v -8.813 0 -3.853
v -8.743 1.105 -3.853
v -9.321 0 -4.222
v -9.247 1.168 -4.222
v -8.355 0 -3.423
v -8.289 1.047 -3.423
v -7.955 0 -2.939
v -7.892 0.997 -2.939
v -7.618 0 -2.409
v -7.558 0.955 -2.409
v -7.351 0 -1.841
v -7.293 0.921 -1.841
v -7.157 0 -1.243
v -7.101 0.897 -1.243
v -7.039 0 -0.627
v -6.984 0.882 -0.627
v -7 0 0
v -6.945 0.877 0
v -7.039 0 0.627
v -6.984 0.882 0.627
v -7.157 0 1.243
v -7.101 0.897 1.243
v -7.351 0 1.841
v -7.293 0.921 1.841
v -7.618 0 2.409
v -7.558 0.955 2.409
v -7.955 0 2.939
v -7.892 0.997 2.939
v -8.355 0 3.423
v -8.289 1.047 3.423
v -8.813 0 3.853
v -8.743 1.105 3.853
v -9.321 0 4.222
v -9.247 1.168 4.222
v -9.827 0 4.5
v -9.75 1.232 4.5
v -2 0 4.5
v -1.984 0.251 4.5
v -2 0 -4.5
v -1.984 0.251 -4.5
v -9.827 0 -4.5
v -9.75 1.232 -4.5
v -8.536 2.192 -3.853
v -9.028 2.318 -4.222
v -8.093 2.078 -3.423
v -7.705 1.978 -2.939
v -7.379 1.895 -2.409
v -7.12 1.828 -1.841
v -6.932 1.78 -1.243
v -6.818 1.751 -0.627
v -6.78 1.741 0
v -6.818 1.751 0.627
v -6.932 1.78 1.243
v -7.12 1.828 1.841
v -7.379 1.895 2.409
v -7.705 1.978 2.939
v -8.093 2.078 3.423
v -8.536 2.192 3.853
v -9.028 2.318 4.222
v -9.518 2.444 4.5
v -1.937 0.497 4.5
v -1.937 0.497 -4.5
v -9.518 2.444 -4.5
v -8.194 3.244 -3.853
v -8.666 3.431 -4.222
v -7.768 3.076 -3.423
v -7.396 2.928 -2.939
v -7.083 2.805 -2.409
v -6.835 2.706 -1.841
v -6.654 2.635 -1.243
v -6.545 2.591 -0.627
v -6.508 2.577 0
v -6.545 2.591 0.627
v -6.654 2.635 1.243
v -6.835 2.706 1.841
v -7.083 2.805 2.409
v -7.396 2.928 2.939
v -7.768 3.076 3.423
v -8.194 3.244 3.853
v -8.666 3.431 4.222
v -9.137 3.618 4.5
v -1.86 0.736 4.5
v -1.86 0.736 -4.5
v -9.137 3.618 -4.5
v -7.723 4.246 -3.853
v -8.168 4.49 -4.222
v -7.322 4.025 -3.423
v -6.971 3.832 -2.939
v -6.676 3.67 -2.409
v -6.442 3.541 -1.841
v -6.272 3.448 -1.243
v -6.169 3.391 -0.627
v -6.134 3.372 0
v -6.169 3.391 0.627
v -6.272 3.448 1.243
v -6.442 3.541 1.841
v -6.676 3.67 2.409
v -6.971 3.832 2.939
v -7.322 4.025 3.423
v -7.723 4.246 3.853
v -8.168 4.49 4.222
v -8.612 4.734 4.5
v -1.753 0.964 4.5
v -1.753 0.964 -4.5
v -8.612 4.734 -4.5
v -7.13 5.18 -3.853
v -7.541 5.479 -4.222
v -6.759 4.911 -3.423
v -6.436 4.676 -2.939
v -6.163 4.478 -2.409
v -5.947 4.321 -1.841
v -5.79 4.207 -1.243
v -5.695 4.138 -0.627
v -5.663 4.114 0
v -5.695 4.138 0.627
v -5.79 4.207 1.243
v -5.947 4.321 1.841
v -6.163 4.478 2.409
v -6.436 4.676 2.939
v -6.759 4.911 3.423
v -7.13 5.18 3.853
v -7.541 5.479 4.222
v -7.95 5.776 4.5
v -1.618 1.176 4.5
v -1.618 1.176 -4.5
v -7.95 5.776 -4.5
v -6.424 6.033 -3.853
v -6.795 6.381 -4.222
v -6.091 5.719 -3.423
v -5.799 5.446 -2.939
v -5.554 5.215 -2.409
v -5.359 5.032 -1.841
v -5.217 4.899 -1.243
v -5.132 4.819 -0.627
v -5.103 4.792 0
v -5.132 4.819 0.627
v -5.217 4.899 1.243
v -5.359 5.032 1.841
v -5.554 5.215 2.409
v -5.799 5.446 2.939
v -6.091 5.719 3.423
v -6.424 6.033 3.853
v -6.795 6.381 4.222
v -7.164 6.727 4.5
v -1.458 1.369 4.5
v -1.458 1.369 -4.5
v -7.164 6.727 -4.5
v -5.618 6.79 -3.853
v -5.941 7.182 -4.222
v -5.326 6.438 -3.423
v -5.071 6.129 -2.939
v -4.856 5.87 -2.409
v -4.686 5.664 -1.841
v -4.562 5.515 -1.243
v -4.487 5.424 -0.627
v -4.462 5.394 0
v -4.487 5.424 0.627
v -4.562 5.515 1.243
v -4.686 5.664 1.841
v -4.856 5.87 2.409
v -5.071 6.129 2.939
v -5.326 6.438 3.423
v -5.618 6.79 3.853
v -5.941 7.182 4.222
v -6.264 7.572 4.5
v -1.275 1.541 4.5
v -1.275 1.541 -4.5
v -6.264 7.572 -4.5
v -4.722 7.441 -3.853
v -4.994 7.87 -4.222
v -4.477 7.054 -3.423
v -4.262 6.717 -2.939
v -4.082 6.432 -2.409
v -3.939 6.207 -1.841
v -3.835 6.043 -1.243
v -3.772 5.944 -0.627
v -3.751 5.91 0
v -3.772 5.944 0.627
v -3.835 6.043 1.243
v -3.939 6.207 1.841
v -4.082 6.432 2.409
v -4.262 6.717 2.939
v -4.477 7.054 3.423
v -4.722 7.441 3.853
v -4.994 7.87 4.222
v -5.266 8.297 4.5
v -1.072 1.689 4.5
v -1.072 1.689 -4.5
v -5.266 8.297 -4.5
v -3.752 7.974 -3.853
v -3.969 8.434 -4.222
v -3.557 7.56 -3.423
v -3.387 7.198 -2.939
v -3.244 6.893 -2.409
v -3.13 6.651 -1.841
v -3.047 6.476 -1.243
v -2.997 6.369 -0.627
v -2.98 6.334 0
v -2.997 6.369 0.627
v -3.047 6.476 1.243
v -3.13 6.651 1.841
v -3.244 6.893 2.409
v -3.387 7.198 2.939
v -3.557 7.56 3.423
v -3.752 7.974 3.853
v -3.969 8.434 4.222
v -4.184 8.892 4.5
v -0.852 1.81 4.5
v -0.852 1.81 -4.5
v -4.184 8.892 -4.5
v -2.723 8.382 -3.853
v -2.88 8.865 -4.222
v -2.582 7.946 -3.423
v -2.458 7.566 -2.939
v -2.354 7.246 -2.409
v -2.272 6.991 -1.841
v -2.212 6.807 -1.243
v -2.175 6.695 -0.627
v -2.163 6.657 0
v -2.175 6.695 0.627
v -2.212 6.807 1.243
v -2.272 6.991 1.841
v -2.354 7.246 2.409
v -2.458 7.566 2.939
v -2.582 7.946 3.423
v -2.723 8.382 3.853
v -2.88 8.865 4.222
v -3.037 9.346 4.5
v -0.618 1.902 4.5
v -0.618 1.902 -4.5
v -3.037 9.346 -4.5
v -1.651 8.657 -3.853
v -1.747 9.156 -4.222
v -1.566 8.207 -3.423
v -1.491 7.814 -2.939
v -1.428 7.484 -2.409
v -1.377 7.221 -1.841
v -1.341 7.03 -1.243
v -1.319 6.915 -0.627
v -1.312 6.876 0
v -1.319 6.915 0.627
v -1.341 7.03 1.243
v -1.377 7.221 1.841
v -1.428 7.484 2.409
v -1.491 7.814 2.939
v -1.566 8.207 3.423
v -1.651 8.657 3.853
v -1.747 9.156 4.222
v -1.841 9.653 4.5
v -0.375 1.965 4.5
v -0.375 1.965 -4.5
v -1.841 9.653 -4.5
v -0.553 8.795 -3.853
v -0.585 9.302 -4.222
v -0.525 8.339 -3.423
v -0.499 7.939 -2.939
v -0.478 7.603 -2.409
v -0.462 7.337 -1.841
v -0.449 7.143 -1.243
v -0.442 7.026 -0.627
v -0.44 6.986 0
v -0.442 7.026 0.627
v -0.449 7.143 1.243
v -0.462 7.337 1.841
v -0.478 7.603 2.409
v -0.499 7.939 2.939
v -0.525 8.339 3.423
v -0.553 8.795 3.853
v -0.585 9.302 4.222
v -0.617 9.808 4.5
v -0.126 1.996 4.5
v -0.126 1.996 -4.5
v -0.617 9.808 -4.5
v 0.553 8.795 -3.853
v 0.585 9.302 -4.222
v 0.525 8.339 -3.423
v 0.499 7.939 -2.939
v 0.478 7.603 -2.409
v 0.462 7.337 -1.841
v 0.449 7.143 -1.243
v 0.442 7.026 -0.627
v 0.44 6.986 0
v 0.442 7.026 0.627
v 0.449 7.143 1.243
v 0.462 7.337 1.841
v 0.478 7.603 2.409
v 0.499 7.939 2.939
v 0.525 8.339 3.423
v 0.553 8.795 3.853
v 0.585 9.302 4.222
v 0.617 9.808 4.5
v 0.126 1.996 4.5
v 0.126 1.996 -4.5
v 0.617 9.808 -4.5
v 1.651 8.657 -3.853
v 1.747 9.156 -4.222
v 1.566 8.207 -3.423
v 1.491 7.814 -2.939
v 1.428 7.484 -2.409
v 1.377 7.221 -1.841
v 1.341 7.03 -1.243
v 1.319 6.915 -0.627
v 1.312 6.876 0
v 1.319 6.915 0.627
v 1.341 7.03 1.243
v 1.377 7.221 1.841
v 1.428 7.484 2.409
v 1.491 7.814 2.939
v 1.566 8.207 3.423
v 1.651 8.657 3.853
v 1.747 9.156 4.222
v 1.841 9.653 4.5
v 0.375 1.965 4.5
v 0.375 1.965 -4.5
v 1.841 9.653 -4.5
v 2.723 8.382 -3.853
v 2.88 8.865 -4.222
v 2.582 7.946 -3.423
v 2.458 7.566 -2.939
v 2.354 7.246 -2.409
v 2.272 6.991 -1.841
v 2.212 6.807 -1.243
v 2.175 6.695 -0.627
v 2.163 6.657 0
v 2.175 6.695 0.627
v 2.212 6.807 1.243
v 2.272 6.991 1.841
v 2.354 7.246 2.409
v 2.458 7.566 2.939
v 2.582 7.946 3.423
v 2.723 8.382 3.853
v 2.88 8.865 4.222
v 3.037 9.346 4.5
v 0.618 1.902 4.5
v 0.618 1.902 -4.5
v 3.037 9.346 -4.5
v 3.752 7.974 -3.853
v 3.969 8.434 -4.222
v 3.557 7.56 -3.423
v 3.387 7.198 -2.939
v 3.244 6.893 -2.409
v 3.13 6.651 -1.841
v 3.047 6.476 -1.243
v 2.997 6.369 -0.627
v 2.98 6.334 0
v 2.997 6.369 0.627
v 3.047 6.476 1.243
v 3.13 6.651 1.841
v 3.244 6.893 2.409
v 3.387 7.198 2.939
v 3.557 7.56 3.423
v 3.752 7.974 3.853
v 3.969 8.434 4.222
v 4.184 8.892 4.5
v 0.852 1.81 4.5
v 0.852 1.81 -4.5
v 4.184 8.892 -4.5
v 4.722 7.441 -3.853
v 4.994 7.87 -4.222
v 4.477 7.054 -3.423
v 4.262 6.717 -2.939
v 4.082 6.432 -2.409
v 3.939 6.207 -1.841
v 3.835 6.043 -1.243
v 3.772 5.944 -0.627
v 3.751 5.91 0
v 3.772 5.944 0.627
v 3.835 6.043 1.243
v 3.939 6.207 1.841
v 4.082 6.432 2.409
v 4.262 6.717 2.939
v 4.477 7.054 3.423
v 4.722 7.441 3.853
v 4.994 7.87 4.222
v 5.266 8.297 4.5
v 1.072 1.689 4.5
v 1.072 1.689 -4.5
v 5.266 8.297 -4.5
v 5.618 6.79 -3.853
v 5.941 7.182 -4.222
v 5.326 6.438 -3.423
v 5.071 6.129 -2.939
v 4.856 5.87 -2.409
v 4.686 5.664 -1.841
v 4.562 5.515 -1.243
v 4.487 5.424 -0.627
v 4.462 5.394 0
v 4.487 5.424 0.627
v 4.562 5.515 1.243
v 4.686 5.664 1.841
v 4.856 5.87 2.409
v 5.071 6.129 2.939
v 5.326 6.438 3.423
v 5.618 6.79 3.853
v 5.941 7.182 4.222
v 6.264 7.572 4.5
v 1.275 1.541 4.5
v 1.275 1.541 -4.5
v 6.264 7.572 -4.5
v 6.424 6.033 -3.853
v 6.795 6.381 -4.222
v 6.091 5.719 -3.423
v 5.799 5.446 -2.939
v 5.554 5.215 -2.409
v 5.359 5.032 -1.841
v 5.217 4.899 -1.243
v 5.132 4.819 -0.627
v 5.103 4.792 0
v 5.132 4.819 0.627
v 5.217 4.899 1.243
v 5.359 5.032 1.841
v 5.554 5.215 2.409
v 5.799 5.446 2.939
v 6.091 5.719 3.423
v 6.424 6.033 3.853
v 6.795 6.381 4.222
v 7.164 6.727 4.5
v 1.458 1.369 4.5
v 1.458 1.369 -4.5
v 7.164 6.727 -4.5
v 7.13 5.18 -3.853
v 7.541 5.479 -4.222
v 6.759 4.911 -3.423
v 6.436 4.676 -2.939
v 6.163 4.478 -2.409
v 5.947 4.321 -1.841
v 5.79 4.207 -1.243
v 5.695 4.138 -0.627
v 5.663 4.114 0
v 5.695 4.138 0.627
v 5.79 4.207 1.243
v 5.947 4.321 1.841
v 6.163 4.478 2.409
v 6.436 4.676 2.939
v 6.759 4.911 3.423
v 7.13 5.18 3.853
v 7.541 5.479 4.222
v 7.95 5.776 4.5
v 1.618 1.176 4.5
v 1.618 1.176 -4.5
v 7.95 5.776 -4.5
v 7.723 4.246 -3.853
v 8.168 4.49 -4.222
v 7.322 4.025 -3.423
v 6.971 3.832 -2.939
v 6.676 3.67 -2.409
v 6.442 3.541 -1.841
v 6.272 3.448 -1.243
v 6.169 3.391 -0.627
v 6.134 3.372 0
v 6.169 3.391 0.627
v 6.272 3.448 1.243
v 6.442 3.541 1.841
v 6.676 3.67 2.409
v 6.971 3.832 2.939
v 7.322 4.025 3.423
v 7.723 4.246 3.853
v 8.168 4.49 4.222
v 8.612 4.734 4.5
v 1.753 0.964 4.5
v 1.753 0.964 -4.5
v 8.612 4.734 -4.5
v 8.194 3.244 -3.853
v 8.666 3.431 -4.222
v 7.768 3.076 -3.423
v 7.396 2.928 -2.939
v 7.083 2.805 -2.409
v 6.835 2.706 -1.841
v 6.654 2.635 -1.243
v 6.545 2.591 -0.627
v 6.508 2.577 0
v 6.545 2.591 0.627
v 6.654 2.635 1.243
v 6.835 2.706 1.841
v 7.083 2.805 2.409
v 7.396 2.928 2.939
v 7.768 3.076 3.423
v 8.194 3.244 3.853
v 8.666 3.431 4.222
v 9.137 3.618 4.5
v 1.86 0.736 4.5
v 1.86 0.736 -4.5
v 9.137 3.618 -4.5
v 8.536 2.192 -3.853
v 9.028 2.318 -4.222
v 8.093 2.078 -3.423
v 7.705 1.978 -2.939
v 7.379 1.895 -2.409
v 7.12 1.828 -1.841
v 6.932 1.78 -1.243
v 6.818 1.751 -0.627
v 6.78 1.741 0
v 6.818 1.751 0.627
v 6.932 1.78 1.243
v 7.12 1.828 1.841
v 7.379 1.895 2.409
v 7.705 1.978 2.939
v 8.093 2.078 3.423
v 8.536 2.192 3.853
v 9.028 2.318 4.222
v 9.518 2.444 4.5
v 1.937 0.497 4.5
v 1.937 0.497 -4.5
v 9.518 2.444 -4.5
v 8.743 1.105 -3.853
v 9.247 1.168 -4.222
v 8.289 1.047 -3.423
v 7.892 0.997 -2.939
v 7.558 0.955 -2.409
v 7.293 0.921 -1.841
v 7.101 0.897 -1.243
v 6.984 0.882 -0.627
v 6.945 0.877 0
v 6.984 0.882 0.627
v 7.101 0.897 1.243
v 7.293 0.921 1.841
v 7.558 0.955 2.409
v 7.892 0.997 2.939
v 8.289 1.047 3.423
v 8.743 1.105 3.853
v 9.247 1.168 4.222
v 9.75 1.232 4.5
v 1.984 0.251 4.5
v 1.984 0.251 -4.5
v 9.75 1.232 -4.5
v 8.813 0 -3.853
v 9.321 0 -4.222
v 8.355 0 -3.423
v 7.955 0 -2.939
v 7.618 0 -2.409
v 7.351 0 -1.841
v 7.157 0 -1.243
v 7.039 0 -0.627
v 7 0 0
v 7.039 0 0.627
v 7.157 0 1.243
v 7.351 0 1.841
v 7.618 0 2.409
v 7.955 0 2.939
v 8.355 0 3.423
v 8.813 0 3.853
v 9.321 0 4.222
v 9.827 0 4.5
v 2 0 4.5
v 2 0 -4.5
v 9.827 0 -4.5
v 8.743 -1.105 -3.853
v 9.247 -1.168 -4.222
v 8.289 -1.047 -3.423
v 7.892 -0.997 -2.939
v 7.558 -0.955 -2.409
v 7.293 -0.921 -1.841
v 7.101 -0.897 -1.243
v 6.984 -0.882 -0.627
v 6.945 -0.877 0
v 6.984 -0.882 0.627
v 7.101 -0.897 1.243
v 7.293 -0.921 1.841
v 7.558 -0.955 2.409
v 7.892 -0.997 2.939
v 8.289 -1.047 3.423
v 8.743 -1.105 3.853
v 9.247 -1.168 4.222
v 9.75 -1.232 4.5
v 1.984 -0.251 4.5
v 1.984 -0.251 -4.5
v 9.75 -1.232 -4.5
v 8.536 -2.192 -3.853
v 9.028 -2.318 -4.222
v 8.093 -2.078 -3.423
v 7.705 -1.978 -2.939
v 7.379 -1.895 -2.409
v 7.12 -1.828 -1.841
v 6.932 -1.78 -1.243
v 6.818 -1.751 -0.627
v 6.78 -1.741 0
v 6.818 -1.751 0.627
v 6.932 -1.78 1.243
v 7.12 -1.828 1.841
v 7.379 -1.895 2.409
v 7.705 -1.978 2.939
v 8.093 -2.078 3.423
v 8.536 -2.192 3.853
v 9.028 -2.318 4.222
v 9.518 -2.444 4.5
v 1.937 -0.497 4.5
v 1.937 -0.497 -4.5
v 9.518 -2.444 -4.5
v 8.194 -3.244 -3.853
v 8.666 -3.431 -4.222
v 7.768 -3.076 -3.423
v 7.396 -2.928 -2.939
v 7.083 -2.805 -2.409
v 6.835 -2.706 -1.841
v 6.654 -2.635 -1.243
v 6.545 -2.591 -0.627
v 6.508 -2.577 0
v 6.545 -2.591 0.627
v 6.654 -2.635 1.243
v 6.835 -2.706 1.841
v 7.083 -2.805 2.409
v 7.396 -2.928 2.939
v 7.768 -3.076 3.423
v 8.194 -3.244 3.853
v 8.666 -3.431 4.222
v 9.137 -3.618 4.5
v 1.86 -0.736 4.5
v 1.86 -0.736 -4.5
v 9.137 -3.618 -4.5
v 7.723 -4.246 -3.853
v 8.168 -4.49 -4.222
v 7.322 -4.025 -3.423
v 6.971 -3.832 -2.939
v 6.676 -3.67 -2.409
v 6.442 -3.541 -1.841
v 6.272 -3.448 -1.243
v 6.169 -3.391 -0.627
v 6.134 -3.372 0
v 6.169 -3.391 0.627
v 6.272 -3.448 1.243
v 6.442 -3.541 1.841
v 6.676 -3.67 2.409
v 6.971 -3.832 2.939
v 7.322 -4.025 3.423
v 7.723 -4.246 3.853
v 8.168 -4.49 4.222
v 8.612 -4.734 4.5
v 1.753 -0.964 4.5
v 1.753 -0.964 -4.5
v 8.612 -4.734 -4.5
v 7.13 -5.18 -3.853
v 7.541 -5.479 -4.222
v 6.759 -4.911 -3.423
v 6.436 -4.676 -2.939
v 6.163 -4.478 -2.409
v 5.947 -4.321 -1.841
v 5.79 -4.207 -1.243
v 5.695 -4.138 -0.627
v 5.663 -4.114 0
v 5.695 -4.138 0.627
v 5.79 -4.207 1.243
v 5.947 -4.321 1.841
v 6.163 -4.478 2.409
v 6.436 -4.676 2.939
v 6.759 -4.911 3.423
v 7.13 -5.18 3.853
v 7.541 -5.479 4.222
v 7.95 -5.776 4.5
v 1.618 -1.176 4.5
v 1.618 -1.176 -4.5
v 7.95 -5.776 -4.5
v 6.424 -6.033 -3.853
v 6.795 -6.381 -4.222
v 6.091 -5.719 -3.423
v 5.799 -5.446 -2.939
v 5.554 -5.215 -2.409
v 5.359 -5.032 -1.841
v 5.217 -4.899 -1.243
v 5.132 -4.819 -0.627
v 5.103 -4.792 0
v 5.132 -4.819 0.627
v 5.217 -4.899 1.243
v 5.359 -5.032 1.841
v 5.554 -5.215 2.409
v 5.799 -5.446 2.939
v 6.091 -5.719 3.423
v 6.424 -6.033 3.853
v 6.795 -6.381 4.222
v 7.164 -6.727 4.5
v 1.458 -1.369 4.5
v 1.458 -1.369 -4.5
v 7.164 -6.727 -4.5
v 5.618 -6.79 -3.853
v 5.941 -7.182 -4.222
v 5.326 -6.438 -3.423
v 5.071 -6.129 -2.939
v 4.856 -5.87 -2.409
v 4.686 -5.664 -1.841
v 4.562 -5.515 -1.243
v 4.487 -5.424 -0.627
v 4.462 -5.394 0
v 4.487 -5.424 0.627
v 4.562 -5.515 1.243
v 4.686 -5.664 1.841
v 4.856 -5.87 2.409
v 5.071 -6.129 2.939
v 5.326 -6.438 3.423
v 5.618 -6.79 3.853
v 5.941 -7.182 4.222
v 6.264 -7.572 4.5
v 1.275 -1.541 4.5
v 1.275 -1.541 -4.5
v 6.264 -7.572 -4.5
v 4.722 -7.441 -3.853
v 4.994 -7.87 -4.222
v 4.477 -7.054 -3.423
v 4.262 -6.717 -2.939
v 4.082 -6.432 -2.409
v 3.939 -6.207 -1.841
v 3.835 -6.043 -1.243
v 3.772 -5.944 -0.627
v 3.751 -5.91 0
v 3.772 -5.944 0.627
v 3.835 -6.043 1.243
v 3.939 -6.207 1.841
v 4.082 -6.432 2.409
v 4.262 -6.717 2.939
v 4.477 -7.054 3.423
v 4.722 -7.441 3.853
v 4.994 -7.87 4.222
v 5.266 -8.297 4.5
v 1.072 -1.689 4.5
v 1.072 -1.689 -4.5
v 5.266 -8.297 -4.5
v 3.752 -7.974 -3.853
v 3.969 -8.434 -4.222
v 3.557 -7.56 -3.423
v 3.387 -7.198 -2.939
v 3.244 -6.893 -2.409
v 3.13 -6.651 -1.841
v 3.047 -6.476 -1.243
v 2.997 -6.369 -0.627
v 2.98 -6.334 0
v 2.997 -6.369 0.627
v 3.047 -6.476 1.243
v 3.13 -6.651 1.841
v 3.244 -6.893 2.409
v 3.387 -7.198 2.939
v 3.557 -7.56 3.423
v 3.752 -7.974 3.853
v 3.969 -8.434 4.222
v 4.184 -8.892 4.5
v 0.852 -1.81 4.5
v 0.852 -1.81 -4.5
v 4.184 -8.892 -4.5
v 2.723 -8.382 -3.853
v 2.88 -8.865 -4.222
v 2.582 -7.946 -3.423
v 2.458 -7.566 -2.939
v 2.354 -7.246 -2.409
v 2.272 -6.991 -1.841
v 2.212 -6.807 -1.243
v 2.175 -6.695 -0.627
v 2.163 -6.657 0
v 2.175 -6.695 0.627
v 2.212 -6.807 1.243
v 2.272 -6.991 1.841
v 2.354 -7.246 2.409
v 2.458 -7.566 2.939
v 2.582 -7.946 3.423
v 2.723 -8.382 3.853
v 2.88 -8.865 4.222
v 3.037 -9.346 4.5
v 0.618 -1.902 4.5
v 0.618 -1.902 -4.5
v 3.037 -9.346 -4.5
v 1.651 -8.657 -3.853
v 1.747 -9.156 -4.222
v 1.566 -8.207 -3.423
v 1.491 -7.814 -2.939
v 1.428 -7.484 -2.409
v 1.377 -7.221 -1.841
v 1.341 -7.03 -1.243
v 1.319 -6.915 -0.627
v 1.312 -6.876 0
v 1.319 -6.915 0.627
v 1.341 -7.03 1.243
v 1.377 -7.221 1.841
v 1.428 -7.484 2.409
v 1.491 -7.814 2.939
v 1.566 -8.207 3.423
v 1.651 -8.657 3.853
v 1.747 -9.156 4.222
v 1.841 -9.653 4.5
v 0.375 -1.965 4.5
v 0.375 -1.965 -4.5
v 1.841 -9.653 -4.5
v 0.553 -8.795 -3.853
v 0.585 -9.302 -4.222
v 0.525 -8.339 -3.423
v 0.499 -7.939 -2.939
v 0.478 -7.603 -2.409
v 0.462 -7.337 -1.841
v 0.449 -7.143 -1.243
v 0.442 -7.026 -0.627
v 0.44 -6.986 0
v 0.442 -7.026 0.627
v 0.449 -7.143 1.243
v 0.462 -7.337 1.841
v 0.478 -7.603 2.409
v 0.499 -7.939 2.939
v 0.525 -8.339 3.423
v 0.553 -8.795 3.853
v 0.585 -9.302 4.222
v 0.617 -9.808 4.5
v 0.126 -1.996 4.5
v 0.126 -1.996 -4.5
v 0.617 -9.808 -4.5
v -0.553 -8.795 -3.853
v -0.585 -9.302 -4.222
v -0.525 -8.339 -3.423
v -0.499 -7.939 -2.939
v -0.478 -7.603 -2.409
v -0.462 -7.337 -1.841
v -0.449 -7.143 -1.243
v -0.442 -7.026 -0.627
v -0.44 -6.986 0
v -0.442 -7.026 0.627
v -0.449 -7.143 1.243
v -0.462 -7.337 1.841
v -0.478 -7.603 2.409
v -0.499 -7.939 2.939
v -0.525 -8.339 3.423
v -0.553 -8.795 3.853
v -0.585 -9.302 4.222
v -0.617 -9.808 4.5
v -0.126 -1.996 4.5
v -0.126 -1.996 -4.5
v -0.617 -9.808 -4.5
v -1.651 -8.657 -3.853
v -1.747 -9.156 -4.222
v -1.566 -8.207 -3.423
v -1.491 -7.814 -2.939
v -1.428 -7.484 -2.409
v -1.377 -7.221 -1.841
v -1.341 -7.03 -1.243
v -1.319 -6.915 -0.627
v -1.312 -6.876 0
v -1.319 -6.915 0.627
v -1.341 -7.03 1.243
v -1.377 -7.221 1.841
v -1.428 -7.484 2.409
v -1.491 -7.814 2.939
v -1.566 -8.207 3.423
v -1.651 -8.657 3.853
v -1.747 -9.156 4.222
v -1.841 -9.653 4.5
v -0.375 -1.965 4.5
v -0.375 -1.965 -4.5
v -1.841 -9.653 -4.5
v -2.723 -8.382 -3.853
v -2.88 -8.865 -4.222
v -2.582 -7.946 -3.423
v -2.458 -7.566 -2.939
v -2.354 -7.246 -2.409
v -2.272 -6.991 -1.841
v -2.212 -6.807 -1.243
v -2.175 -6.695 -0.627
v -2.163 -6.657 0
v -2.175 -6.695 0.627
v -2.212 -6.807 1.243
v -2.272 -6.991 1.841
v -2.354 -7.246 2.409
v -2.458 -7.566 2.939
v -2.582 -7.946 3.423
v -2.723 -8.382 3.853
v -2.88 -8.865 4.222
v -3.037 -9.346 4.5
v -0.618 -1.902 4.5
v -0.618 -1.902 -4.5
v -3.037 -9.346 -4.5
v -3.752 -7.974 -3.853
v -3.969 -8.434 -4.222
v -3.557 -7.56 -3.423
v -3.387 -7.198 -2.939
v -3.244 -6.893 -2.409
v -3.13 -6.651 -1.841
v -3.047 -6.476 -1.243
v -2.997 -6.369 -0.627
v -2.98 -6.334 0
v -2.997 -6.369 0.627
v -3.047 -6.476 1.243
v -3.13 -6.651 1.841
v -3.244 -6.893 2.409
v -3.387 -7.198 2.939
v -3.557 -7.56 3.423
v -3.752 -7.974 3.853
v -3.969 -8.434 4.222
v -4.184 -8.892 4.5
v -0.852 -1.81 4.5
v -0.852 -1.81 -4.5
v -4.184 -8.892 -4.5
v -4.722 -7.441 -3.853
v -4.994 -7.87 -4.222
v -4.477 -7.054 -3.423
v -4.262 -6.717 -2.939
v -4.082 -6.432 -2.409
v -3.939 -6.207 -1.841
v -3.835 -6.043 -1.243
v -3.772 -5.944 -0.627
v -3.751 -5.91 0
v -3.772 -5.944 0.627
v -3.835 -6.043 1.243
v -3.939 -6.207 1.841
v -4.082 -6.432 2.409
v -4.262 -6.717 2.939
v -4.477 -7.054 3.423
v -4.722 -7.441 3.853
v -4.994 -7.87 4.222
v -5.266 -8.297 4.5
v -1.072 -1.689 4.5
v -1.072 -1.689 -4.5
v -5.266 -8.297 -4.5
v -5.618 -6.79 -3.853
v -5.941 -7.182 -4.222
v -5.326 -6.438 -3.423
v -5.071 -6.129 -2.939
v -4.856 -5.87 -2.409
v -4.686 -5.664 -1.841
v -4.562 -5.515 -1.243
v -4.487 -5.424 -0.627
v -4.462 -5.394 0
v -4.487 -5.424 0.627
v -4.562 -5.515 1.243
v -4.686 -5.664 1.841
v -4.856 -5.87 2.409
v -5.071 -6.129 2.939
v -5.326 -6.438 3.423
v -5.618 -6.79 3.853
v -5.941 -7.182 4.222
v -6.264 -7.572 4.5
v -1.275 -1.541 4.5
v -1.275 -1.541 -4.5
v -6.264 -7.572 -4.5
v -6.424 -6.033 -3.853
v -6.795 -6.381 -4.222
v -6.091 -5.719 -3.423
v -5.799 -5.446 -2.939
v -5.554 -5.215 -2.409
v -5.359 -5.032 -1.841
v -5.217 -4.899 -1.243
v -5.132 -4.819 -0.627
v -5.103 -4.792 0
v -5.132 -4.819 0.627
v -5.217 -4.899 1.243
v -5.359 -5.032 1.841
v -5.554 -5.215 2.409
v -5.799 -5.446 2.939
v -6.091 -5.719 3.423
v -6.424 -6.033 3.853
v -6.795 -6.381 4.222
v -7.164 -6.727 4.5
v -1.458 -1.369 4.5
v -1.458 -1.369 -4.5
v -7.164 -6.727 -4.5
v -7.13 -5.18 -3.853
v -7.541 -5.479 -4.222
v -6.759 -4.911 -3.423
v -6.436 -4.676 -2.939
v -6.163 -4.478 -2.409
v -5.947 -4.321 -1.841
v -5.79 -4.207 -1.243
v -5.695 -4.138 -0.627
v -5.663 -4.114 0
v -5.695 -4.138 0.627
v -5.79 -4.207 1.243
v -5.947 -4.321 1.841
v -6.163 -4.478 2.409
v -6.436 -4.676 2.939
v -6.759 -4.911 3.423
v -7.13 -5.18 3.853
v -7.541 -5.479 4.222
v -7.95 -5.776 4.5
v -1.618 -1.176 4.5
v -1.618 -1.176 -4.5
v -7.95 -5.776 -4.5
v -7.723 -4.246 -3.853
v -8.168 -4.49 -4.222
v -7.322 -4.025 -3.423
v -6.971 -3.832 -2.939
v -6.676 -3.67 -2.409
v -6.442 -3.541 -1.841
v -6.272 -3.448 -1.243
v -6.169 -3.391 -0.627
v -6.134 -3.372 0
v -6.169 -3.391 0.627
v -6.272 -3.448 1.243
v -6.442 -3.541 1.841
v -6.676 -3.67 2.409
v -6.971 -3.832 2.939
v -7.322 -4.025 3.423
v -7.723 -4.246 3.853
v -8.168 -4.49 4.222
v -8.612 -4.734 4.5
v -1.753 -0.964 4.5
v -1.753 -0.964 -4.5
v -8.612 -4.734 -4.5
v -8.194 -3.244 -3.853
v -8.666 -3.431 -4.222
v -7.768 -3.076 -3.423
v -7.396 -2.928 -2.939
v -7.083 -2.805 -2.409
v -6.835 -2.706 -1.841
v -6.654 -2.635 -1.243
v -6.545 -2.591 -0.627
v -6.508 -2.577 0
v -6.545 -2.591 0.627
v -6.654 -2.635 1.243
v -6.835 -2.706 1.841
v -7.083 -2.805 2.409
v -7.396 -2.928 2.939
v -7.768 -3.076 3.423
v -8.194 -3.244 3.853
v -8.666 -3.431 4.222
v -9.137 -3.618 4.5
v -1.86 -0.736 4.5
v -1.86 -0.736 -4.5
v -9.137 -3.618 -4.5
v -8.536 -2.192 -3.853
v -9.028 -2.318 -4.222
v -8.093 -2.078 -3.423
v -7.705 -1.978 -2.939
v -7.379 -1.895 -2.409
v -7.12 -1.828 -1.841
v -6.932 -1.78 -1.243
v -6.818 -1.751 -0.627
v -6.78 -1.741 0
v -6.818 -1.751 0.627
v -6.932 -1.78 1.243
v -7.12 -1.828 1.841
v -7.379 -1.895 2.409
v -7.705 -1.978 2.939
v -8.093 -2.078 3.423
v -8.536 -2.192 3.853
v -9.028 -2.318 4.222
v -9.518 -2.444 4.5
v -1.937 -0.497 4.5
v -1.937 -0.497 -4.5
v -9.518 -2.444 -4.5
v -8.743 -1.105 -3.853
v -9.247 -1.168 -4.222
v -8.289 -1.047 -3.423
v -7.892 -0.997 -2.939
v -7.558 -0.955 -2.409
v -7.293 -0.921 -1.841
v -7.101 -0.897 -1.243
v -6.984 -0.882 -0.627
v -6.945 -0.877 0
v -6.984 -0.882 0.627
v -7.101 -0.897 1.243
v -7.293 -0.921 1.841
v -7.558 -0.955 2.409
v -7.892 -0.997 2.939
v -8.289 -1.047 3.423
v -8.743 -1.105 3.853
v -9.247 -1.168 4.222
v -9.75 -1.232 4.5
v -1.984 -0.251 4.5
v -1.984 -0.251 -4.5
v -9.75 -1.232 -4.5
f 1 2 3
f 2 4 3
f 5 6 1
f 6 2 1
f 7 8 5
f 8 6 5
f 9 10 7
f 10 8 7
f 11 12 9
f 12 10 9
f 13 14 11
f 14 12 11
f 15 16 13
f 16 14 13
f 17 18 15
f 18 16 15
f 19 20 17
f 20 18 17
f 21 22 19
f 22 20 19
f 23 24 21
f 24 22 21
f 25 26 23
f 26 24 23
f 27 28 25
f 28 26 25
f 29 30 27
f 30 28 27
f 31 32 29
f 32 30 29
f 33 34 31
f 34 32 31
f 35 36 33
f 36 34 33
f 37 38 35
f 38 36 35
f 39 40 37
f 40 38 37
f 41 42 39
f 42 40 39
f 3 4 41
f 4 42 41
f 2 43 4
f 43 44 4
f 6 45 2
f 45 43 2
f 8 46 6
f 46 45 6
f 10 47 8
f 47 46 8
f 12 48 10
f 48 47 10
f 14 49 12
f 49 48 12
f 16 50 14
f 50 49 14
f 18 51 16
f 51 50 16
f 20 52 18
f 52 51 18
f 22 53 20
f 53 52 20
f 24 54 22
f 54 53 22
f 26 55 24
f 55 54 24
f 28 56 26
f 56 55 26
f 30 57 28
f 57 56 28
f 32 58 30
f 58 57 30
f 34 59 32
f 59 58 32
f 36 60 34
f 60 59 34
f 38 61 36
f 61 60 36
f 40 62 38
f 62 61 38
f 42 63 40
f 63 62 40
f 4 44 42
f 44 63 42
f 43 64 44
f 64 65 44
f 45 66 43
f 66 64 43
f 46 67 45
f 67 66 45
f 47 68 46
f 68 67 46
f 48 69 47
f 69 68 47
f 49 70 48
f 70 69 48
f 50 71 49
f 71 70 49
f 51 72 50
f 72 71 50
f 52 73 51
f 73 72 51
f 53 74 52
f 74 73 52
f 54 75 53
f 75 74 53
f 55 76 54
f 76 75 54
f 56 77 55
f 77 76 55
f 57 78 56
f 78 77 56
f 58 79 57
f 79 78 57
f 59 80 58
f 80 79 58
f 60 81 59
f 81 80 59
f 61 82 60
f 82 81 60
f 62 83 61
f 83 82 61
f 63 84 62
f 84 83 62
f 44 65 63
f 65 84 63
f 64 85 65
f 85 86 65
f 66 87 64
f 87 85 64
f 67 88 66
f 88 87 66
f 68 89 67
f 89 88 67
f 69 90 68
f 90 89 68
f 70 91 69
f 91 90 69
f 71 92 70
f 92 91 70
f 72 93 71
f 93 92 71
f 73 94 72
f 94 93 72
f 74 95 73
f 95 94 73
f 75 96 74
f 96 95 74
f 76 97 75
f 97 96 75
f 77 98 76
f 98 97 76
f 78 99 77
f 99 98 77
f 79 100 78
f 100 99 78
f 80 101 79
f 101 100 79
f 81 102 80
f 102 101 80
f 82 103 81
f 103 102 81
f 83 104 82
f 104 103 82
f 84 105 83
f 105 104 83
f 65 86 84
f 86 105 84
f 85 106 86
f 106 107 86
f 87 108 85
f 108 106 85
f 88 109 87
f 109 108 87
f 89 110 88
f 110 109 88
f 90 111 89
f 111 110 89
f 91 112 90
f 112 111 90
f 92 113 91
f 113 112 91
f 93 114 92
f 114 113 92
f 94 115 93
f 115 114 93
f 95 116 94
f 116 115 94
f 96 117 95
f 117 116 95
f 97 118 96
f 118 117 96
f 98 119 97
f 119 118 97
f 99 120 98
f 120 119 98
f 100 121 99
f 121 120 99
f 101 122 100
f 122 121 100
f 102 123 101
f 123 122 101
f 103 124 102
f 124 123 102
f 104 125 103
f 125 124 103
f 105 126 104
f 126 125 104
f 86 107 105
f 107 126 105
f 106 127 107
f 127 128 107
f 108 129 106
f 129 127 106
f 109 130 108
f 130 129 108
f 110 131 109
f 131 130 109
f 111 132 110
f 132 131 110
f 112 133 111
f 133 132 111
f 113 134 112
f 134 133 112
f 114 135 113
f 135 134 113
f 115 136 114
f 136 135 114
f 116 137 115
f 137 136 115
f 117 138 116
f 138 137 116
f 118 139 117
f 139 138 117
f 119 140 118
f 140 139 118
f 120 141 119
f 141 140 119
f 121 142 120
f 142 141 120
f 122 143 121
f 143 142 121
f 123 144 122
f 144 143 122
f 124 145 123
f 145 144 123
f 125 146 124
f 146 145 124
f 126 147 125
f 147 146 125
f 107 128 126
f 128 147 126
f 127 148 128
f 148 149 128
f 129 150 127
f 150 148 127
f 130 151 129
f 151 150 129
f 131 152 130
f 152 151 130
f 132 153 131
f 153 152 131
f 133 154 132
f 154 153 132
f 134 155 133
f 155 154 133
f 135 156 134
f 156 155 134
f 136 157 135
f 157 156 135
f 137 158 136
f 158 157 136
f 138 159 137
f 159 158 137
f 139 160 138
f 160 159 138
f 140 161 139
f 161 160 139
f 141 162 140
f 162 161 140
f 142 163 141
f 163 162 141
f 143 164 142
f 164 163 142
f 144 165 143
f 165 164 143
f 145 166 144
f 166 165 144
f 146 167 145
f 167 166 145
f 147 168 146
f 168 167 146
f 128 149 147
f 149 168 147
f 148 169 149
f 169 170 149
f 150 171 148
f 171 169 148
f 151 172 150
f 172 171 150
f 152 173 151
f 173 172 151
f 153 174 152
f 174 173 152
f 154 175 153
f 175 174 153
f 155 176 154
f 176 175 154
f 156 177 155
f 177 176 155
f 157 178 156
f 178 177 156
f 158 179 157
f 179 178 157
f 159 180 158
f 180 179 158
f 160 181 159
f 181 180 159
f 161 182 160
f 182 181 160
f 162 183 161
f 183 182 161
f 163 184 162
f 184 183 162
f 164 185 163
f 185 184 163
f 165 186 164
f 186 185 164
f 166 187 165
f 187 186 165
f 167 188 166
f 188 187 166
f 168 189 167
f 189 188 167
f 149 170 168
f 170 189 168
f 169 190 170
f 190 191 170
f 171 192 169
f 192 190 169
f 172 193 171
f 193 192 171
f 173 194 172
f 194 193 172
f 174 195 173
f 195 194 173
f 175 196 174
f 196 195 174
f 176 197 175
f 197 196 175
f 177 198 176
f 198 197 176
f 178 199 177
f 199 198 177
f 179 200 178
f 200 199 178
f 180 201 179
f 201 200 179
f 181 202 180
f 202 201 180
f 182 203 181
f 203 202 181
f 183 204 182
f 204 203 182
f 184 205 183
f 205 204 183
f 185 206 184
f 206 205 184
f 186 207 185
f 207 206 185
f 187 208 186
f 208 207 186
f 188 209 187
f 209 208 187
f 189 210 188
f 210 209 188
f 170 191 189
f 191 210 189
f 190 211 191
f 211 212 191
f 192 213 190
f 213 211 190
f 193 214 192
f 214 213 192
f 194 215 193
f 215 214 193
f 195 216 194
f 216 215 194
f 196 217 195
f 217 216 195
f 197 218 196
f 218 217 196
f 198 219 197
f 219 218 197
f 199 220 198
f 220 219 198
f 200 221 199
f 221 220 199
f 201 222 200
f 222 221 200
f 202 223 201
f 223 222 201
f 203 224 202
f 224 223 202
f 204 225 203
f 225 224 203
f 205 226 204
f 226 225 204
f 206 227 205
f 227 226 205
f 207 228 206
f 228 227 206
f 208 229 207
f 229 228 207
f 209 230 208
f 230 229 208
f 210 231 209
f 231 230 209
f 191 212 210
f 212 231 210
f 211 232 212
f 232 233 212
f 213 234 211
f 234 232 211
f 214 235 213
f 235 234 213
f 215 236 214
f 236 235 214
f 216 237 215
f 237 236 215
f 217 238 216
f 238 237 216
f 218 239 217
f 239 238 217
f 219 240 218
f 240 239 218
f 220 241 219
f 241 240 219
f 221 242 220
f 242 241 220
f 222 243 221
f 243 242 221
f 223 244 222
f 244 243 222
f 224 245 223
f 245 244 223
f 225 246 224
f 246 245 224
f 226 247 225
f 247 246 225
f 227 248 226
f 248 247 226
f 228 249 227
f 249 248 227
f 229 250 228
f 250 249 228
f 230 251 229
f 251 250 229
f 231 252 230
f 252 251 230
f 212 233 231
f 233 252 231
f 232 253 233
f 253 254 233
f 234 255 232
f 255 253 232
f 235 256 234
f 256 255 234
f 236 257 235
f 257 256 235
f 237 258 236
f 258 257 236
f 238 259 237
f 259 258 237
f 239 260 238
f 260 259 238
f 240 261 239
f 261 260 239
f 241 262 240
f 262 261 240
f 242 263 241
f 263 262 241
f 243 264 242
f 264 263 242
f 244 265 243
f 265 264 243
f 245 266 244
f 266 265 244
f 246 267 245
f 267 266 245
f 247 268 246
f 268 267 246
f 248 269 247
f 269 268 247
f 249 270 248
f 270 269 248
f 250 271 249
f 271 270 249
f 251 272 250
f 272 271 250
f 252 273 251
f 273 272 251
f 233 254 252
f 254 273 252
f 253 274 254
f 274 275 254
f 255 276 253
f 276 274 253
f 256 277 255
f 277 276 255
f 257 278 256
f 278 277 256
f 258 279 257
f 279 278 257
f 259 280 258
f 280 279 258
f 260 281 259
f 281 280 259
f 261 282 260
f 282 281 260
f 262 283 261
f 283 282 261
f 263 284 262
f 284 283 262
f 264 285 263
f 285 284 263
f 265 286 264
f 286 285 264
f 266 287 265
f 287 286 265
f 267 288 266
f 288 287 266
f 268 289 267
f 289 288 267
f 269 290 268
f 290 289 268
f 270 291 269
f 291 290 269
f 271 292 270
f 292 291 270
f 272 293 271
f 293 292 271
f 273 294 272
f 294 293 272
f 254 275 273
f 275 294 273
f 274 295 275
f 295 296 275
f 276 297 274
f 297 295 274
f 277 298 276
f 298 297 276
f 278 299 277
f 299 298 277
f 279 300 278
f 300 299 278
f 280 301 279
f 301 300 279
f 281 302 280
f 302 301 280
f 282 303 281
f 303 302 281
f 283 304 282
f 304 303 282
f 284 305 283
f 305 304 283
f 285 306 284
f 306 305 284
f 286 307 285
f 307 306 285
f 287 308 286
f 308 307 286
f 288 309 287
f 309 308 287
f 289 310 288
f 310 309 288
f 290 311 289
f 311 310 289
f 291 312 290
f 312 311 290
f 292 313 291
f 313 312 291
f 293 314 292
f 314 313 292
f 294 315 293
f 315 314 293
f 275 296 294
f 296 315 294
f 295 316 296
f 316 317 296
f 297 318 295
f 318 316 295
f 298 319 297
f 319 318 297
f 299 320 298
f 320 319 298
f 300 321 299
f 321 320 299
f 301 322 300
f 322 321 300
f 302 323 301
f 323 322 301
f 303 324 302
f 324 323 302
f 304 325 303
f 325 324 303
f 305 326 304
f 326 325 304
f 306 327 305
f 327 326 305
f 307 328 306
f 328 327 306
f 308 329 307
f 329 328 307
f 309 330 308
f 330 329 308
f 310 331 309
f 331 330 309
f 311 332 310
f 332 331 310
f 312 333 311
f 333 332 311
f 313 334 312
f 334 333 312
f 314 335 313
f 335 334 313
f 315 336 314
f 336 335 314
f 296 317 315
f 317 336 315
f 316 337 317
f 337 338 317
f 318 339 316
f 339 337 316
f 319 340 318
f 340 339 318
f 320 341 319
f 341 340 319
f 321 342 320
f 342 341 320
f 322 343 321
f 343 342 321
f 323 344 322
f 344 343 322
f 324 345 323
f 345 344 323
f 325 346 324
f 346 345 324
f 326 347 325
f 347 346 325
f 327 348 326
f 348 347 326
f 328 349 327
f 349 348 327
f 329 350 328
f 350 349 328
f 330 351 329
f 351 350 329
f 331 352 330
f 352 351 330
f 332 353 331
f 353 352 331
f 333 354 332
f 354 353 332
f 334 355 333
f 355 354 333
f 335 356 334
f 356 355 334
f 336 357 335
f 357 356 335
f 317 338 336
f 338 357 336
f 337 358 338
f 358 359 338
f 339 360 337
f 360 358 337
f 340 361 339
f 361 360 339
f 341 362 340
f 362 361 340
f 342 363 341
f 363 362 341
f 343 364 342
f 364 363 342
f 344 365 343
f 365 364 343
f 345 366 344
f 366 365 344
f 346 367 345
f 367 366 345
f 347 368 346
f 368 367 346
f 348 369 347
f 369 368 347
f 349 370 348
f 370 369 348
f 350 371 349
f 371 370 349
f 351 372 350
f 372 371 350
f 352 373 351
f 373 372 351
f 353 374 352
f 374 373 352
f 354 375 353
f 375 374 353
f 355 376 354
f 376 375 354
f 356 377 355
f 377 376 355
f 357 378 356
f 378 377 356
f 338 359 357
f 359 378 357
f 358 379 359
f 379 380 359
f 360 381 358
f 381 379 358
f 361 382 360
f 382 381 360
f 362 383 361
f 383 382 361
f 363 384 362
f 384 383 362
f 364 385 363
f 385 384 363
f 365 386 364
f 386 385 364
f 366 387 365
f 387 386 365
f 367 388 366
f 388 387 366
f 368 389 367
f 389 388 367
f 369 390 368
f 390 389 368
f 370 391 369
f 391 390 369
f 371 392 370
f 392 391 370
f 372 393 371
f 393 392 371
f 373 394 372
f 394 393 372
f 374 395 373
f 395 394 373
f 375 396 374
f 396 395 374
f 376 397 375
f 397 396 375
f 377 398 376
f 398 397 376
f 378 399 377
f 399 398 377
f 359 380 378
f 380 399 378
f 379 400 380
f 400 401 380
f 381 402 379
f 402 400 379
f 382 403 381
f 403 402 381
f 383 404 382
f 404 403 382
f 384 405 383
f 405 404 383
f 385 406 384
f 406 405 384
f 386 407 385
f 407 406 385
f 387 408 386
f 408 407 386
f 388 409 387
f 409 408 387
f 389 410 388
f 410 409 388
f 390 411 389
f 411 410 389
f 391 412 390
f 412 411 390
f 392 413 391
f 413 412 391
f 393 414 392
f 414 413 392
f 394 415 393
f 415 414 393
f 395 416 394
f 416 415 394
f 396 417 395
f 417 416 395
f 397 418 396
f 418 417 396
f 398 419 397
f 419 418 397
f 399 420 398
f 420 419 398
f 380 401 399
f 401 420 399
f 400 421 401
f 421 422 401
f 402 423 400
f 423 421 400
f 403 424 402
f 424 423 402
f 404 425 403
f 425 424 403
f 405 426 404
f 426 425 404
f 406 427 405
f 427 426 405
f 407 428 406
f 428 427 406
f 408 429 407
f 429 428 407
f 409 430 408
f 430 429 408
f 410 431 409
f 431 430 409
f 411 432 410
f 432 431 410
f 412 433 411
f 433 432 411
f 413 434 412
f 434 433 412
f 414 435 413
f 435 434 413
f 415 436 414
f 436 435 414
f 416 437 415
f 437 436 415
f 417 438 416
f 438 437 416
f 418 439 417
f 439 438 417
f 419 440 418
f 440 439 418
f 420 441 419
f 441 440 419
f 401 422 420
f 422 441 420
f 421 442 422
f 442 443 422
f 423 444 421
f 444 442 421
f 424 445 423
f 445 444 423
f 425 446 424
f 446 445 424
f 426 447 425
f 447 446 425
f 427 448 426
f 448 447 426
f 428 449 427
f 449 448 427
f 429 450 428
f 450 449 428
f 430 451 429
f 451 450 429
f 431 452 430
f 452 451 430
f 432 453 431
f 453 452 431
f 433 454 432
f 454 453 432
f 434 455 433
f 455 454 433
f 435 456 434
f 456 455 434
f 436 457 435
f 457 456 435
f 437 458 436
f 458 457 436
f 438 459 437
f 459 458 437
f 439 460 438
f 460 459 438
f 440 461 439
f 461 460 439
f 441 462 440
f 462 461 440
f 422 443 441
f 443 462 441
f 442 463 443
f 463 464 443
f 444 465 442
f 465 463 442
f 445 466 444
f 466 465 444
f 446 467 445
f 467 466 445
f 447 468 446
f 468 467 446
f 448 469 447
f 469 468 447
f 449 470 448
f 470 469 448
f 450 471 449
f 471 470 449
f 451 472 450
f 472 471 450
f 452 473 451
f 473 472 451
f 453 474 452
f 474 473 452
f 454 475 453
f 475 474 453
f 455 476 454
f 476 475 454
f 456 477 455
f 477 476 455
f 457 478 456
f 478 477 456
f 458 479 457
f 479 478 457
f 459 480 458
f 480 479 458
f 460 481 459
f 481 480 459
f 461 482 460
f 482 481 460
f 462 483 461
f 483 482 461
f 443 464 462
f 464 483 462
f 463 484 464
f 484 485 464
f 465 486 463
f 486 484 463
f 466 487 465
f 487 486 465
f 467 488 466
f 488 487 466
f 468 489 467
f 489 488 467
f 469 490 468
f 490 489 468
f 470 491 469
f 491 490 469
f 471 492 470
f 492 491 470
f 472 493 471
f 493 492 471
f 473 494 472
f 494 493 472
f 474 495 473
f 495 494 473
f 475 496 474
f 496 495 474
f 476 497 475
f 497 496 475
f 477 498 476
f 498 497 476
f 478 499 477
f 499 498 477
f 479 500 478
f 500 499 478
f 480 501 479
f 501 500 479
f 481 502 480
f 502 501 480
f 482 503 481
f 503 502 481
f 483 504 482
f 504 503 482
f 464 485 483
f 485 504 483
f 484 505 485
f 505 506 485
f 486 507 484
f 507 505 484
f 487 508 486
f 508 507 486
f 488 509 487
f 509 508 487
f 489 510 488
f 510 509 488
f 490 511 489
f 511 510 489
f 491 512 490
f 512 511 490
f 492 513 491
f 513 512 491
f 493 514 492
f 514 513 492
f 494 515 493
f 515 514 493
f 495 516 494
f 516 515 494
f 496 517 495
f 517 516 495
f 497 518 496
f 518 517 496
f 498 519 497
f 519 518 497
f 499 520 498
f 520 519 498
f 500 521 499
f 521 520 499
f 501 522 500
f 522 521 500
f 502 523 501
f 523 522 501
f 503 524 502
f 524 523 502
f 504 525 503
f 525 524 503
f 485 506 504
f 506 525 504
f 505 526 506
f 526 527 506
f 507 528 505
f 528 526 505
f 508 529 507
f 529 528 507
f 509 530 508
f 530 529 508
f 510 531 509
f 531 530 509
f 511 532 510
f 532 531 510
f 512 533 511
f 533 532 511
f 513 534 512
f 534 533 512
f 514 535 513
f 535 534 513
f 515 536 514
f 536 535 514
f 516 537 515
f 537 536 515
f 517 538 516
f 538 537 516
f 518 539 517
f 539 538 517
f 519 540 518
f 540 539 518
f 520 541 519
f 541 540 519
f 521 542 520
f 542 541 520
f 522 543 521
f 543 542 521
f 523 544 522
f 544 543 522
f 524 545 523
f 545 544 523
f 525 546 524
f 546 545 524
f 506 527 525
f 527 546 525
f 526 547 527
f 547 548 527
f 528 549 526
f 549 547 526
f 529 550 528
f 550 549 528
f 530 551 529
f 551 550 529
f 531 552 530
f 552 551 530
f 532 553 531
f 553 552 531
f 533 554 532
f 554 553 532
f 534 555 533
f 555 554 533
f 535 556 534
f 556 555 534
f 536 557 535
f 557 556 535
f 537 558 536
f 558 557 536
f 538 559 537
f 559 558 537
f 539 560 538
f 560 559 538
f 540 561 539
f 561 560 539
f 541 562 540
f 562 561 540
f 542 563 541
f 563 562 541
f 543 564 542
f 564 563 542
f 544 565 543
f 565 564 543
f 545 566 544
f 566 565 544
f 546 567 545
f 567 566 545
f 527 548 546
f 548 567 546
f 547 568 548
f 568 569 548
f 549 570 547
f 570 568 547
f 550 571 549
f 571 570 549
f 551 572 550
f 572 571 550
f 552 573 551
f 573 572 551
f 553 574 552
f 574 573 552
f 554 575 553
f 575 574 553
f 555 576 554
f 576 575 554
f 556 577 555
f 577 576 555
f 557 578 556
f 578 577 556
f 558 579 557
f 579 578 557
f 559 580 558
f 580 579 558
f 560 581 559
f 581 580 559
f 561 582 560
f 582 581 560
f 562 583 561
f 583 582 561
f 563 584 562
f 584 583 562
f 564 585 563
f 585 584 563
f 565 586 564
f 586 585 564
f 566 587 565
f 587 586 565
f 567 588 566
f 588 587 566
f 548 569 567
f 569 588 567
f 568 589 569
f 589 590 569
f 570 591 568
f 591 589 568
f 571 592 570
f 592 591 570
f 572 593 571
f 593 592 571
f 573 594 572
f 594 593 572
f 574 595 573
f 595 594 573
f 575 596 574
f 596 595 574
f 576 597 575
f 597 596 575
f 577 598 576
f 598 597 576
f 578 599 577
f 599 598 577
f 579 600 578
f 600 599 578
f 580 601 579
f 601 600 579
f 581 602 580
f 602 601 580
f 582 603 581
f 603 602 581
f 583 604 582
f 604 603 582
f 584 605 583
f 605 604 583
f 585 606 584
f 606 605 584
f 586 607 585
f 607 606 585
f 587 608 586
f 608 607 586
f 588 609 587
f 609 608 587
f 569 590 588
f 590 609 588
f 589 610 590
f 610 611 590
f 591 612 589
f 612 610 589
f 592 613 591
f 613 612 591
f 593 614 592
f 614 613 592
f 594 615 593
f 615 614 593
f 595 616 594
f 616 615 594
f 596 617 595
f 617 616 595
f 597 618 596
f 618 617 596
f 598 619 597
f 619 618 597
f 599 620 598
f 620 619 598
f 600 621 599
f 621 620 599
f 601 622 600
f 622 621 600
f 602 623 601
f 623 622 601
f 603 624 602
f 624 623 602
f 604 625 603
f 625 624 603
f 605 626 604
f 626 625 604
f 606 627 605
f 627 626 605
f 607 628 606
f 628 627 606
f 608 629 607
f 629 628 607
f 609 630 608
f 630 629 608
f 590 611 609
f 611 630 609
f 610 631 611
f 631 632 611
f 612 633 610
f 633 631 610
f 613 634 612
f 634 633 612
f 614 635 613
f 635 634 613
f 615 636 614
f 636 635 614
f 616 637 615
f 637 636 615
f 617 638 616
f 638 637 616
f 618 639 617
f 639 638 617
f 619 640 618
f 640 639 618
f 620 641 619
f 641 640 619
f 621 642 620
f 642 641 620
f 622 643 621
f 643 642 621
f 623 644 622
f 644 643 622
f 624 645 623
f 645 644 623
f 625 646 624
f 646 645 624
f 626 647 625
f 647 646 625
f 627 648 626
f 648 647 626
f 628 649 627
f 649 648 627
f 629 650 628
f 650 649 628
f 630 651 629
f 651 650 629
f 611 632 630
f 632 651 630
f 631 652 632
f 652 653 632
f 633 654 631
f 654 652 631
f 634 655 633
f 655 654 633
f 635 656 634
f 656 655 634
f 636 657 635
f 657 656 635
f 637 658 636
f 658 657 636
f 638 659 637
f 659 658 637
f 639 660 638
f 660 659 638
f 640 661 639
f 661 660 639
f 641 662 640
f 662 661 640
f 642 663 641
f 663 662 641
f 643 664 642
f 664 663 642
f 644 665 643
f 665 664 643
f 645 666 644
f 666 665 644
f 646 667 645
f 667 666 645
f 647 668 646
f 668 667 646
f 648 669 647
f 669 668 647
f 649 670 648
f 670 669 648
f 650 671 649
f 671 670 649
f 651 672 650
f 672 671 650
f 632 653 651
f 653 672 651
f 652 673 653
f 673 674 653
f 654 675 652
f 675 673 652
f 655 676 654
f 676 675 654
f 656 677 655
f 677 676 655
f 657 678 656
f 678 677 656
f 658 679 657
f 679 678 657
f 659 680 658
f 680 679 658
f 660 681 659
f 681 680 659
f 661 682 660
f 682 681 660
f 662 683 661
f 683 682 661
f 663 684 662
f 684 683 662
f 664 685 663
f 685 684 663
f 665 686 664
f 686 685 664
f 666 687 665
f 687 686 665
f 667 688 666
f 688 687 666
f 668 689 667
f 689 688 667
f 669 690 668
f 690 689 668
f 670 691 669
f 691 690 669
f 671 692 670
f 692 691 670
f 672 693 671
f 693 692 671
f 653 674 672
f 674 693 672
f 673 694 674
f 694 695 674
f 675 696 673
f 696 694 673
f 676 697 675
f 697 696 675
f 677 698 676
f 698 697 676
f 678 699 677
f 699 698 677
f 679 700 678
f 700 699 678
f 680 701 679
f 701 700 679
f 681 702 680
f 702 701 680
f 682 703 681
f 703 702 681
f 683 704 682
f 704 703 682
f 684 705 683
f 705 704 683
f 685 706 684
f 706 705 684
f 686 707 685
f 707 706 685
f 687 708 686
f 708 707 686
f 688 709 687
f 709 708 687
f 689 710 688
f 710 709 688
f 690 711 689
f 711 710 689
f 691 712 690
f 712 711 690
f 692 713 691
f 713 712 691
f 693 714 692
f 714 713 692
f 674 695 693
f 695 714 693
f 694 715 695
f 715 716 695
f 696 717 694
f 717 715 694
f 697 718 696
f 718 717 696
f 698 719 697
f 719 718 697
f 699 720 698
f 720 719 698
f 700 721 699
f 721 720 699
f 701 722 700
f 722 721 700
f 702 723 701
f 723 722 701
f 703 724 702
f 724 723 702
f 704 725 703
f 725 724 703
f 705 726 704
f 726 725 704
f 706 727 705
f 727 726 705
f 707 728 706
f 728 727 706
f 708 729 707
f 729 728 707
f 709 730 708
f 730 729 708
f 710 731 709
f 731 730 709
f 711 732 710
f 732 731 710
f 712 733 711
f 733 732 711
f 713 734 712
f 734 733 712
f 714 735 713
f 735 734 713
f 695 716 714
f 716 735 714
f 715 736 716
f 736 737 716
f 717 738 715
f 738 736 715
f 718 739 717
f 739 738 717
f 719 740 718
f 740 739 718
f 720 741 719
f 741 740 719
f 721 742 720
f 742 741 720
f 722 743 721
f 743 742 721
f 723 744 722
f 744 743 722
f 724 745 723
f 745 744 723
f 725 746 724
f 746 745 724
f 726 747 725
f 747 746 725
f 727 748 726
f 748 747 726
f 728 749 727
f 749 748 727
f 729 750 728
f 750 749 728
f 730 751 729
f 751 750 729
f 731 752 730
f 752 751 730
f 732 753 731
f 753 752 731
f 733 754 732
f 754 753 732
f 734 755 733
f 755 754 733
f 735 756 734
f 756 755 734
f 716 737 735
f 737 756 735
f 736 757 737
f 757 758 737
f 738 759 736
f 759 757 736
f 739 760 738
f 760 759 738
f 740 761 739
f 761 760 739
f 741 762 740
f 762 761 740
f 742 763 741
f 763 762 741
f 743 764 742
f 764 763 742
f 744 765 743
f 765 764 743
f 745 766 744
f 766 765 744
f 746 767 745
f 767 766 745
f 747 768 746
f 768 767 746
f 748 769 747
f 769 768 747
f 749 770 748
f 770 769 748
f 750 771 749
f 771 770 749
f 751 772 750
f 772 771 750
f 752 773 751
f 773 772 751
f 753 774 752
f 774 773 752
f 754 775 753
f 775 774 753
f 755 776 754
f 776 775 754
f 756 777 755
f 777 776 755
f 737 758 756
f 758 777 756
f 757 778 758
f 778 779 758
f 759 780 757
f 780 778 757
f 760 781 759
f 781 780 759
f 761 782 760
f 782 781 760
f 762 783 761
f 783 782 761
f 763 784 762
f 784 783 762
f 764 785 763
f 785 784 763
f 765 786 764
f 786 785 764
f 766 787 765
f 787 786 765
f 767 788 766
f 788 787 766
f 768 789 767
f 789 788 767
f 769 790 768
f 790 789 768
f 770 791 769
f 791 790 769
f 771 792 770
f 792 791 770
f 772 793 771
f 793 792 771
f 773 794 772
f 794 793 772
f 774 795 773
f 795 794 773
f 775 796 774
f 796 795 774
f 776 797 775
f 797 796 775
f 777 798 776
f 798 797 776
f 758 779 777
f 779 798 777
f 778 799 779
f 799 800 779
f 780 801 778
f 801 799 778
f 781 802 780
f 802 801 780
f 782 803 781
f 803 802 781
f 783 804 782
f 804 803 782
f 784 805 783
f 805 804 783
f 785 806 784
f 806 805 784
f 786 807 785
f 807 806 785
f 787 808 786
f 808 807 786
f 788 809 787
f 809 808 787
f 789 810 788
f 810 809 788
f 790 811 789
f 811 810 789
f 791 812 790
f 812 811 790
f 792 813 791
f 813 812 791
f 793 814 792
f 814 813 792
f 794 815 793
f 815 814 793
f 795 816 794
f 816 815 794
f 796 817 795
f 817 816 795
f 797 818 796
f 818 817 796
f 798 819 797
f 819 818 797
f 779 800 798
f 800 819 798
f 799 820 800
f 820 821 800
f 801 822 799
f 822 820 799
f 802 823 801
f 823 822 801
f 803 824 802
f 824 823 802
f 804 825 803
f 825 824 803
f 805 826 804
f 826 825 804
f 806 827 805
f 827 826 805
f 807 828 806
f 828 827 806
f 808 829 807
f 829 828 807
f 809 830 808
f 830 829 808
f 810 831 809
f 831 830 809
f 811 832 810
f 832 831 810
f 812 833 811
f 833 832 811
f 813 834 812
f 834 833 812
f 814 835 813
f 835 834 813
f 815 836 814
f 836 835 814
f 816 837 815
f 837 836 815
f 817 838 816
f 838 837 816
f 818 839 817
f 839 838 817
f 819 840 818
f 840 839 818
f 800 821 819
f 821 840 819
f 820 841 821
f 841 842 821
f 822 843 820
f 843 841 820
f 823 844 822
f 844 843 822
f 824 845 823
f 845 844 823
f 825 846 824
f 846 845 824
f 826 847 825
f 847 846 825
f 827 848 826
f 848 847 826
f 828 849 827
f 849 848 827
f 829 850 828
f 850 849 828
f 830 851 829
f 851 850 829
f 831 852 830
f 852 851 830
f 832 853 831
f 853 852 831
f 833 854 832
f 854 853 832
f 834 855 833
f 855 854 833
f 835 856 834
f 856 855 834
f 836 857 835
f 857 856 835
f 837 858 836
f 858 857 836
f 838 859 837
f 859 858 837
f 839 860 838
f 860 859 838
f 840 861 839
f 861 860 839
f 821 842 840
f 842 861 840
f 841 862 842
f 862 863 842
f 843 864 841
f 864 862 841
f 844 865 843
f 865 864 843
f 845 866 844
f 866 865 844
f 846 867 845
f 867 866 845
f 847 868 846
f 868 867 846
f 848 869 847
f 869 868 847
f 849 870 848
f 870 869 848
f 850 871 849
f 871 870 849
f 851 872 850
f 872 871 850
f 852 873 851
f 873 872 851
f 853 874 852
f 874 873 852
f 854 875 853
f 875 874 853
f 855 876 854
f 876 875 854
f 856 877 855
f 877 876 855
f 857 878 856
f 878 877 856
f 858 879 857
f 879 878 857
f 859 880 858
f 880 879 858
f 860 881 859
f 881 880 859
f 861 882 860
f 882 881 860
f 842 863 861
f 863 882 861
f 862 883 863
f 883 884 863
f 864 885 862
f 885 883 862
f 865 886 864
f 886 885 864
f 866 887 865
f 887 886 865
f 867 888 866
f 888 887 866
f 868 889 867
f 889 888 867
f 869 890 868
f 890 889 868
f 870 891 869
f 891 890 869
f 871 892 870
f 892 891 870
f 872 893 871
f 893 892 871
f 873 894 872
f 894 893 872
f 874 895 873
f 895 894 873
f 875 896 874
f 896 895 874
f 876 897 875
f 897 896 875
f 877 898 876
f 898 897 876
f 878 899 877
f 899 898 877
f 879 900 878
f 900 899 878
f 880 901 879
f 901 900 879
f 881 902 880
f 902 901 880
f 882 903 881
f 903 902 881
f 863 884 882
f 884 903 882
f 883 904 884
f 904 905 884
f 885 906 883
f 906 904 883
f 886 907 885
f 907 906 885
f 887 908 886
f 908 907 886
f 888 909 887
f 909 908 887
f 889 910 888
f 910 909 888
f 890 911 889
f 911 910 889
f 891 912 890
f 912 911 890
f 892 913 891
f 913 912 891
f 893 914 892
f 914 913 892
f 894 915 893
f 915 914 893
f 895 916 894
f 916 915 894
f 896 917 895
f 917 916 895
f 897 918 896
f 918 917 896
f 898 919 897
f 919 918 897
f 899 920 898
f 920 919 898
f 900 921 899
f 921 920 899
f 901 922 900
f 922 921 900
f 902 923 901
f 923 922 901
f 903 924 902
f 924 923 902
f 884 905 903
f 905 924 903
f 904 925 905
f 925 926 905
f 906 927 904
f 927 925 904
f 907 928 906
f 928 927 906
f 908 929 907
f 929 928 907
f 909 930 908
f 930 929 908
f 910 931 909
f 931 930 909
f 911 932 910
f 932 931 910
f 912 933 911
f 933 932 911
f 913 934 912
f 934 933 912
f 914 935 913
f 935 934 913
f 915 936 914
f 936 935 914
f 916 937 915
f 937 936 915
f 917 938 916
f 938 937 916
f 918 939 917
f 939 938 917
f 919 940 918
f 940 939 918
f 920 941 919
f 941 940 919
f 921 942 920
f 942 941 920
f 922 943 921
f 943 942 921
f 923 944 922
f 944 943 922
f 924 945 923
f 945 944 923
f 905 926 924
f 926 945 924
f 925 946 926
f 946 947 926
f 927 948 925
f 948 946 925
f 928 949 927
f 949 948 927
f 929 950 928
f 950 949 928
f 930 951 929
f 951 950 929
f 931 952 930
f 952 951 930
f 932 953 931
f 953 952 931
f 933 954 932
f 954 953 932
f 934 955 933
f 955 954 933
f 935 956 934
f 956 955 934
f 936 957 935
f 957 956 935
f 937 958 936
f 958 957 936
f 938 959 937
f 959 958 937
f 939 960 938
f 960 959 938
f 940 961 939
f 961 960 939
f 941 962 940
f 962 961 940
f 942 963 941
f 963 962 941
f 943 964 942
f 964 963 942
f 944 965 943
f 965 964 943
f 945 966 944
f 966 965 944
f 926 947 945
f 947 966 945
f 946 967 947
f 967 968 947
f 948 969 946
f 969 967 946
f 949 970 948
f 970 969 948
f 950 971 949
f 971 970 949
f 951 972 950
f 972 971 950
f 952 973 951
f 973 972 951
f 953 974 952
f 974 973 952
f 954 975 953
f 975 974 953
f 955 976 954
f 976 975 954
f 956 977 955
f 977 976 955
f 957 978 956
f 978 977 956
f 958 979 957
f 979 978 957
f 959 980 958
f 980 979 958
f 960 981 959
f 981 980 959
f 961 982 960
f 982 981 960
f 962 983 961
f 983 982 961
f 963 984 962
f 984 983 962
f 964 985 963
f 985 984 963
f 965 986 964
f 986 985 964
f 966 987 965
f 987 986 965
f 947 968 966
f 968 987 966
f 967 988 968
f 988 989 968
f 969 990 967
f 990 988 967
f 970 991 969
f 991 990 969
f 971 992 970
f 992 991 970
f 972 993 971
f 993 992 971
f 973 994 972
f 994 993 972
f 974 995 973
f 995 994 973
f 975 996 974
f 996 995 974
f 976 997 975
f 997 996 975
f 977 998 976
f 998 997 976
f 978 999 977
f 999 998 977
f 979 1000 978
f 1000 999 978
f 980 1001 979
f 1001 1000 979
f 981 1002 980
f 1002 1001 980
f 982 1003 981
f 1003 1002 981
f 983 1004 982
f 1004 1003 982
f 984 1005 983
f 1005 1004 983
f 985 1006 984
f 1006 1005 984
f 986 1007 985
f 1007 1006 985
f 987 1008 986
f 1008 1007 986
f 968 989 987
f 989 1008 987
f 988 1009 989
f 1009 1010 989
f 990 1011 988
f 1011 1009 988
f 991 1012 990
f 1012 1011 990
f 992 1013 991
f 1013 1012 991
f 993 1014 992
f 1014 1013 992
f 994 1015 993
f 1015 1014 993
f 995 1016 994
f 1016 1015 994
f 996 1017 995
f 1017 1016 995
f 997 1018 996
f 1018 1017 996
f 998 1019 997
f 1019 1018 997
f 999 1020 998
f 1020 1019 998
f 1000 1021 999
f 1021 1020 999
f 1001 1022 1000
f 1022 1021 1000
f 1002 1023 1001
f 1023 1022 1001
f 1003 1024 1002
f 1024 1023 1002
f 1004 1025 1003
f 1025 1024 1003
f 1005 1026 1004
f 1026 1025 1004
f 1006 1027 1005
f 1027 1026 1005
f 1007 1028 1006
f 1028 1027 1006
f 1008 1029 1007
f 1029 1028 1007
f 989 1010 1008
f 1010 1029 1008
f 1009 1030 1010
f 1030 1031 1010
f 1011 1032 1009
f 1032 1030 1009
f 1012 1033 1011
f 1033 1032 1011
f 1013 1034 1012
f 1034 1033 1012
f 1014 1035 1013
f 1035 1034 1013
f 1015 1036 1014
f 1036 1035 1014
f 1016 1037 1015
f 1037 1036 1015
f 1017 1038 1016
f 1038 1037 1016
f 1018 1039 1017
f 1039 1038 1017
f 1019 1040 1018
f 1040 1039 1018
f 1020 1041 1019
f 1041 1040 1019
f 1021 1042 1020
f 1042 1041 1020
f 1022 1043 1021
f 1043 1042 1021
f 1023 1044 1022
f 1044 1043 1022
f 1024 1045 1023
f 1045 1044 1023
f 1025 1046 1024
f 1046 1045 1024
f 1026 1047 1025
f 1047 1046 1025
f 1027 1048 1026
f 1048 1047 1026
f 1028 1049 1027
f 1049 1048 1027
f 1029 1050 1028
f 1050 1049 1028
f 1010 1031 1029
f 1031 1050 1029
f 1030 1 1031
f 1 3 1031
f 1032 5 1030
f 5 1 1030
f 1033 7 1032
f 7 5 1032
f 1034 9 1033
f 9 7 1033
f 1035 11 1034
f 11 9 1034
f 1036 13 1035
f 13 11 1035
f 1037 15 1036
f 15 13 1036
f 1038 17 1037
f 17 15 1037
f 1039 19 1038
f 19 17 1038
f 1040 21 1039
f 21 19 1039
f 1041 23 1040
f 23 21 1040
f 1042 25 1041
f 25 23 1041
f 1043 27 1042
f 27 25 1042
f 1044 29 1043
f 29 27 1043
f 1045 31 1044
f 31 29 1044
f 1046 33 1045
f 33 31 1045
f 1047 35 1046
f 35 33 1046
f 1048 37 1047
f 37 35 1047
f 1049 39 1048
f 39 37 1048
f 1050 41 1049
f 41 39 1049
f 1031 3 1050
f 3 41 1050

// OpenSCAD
$fn = 50;
radius = 10;
hole = 2;
height = 9;
rotate_extrude(){
    translate([radius/2+hole, 0, 0]){
        difference(){
            square([radius,height],center=true);
            translate([radius/2,0,0]){
                circle(r=radius/2);
            }
        }
    }
}
